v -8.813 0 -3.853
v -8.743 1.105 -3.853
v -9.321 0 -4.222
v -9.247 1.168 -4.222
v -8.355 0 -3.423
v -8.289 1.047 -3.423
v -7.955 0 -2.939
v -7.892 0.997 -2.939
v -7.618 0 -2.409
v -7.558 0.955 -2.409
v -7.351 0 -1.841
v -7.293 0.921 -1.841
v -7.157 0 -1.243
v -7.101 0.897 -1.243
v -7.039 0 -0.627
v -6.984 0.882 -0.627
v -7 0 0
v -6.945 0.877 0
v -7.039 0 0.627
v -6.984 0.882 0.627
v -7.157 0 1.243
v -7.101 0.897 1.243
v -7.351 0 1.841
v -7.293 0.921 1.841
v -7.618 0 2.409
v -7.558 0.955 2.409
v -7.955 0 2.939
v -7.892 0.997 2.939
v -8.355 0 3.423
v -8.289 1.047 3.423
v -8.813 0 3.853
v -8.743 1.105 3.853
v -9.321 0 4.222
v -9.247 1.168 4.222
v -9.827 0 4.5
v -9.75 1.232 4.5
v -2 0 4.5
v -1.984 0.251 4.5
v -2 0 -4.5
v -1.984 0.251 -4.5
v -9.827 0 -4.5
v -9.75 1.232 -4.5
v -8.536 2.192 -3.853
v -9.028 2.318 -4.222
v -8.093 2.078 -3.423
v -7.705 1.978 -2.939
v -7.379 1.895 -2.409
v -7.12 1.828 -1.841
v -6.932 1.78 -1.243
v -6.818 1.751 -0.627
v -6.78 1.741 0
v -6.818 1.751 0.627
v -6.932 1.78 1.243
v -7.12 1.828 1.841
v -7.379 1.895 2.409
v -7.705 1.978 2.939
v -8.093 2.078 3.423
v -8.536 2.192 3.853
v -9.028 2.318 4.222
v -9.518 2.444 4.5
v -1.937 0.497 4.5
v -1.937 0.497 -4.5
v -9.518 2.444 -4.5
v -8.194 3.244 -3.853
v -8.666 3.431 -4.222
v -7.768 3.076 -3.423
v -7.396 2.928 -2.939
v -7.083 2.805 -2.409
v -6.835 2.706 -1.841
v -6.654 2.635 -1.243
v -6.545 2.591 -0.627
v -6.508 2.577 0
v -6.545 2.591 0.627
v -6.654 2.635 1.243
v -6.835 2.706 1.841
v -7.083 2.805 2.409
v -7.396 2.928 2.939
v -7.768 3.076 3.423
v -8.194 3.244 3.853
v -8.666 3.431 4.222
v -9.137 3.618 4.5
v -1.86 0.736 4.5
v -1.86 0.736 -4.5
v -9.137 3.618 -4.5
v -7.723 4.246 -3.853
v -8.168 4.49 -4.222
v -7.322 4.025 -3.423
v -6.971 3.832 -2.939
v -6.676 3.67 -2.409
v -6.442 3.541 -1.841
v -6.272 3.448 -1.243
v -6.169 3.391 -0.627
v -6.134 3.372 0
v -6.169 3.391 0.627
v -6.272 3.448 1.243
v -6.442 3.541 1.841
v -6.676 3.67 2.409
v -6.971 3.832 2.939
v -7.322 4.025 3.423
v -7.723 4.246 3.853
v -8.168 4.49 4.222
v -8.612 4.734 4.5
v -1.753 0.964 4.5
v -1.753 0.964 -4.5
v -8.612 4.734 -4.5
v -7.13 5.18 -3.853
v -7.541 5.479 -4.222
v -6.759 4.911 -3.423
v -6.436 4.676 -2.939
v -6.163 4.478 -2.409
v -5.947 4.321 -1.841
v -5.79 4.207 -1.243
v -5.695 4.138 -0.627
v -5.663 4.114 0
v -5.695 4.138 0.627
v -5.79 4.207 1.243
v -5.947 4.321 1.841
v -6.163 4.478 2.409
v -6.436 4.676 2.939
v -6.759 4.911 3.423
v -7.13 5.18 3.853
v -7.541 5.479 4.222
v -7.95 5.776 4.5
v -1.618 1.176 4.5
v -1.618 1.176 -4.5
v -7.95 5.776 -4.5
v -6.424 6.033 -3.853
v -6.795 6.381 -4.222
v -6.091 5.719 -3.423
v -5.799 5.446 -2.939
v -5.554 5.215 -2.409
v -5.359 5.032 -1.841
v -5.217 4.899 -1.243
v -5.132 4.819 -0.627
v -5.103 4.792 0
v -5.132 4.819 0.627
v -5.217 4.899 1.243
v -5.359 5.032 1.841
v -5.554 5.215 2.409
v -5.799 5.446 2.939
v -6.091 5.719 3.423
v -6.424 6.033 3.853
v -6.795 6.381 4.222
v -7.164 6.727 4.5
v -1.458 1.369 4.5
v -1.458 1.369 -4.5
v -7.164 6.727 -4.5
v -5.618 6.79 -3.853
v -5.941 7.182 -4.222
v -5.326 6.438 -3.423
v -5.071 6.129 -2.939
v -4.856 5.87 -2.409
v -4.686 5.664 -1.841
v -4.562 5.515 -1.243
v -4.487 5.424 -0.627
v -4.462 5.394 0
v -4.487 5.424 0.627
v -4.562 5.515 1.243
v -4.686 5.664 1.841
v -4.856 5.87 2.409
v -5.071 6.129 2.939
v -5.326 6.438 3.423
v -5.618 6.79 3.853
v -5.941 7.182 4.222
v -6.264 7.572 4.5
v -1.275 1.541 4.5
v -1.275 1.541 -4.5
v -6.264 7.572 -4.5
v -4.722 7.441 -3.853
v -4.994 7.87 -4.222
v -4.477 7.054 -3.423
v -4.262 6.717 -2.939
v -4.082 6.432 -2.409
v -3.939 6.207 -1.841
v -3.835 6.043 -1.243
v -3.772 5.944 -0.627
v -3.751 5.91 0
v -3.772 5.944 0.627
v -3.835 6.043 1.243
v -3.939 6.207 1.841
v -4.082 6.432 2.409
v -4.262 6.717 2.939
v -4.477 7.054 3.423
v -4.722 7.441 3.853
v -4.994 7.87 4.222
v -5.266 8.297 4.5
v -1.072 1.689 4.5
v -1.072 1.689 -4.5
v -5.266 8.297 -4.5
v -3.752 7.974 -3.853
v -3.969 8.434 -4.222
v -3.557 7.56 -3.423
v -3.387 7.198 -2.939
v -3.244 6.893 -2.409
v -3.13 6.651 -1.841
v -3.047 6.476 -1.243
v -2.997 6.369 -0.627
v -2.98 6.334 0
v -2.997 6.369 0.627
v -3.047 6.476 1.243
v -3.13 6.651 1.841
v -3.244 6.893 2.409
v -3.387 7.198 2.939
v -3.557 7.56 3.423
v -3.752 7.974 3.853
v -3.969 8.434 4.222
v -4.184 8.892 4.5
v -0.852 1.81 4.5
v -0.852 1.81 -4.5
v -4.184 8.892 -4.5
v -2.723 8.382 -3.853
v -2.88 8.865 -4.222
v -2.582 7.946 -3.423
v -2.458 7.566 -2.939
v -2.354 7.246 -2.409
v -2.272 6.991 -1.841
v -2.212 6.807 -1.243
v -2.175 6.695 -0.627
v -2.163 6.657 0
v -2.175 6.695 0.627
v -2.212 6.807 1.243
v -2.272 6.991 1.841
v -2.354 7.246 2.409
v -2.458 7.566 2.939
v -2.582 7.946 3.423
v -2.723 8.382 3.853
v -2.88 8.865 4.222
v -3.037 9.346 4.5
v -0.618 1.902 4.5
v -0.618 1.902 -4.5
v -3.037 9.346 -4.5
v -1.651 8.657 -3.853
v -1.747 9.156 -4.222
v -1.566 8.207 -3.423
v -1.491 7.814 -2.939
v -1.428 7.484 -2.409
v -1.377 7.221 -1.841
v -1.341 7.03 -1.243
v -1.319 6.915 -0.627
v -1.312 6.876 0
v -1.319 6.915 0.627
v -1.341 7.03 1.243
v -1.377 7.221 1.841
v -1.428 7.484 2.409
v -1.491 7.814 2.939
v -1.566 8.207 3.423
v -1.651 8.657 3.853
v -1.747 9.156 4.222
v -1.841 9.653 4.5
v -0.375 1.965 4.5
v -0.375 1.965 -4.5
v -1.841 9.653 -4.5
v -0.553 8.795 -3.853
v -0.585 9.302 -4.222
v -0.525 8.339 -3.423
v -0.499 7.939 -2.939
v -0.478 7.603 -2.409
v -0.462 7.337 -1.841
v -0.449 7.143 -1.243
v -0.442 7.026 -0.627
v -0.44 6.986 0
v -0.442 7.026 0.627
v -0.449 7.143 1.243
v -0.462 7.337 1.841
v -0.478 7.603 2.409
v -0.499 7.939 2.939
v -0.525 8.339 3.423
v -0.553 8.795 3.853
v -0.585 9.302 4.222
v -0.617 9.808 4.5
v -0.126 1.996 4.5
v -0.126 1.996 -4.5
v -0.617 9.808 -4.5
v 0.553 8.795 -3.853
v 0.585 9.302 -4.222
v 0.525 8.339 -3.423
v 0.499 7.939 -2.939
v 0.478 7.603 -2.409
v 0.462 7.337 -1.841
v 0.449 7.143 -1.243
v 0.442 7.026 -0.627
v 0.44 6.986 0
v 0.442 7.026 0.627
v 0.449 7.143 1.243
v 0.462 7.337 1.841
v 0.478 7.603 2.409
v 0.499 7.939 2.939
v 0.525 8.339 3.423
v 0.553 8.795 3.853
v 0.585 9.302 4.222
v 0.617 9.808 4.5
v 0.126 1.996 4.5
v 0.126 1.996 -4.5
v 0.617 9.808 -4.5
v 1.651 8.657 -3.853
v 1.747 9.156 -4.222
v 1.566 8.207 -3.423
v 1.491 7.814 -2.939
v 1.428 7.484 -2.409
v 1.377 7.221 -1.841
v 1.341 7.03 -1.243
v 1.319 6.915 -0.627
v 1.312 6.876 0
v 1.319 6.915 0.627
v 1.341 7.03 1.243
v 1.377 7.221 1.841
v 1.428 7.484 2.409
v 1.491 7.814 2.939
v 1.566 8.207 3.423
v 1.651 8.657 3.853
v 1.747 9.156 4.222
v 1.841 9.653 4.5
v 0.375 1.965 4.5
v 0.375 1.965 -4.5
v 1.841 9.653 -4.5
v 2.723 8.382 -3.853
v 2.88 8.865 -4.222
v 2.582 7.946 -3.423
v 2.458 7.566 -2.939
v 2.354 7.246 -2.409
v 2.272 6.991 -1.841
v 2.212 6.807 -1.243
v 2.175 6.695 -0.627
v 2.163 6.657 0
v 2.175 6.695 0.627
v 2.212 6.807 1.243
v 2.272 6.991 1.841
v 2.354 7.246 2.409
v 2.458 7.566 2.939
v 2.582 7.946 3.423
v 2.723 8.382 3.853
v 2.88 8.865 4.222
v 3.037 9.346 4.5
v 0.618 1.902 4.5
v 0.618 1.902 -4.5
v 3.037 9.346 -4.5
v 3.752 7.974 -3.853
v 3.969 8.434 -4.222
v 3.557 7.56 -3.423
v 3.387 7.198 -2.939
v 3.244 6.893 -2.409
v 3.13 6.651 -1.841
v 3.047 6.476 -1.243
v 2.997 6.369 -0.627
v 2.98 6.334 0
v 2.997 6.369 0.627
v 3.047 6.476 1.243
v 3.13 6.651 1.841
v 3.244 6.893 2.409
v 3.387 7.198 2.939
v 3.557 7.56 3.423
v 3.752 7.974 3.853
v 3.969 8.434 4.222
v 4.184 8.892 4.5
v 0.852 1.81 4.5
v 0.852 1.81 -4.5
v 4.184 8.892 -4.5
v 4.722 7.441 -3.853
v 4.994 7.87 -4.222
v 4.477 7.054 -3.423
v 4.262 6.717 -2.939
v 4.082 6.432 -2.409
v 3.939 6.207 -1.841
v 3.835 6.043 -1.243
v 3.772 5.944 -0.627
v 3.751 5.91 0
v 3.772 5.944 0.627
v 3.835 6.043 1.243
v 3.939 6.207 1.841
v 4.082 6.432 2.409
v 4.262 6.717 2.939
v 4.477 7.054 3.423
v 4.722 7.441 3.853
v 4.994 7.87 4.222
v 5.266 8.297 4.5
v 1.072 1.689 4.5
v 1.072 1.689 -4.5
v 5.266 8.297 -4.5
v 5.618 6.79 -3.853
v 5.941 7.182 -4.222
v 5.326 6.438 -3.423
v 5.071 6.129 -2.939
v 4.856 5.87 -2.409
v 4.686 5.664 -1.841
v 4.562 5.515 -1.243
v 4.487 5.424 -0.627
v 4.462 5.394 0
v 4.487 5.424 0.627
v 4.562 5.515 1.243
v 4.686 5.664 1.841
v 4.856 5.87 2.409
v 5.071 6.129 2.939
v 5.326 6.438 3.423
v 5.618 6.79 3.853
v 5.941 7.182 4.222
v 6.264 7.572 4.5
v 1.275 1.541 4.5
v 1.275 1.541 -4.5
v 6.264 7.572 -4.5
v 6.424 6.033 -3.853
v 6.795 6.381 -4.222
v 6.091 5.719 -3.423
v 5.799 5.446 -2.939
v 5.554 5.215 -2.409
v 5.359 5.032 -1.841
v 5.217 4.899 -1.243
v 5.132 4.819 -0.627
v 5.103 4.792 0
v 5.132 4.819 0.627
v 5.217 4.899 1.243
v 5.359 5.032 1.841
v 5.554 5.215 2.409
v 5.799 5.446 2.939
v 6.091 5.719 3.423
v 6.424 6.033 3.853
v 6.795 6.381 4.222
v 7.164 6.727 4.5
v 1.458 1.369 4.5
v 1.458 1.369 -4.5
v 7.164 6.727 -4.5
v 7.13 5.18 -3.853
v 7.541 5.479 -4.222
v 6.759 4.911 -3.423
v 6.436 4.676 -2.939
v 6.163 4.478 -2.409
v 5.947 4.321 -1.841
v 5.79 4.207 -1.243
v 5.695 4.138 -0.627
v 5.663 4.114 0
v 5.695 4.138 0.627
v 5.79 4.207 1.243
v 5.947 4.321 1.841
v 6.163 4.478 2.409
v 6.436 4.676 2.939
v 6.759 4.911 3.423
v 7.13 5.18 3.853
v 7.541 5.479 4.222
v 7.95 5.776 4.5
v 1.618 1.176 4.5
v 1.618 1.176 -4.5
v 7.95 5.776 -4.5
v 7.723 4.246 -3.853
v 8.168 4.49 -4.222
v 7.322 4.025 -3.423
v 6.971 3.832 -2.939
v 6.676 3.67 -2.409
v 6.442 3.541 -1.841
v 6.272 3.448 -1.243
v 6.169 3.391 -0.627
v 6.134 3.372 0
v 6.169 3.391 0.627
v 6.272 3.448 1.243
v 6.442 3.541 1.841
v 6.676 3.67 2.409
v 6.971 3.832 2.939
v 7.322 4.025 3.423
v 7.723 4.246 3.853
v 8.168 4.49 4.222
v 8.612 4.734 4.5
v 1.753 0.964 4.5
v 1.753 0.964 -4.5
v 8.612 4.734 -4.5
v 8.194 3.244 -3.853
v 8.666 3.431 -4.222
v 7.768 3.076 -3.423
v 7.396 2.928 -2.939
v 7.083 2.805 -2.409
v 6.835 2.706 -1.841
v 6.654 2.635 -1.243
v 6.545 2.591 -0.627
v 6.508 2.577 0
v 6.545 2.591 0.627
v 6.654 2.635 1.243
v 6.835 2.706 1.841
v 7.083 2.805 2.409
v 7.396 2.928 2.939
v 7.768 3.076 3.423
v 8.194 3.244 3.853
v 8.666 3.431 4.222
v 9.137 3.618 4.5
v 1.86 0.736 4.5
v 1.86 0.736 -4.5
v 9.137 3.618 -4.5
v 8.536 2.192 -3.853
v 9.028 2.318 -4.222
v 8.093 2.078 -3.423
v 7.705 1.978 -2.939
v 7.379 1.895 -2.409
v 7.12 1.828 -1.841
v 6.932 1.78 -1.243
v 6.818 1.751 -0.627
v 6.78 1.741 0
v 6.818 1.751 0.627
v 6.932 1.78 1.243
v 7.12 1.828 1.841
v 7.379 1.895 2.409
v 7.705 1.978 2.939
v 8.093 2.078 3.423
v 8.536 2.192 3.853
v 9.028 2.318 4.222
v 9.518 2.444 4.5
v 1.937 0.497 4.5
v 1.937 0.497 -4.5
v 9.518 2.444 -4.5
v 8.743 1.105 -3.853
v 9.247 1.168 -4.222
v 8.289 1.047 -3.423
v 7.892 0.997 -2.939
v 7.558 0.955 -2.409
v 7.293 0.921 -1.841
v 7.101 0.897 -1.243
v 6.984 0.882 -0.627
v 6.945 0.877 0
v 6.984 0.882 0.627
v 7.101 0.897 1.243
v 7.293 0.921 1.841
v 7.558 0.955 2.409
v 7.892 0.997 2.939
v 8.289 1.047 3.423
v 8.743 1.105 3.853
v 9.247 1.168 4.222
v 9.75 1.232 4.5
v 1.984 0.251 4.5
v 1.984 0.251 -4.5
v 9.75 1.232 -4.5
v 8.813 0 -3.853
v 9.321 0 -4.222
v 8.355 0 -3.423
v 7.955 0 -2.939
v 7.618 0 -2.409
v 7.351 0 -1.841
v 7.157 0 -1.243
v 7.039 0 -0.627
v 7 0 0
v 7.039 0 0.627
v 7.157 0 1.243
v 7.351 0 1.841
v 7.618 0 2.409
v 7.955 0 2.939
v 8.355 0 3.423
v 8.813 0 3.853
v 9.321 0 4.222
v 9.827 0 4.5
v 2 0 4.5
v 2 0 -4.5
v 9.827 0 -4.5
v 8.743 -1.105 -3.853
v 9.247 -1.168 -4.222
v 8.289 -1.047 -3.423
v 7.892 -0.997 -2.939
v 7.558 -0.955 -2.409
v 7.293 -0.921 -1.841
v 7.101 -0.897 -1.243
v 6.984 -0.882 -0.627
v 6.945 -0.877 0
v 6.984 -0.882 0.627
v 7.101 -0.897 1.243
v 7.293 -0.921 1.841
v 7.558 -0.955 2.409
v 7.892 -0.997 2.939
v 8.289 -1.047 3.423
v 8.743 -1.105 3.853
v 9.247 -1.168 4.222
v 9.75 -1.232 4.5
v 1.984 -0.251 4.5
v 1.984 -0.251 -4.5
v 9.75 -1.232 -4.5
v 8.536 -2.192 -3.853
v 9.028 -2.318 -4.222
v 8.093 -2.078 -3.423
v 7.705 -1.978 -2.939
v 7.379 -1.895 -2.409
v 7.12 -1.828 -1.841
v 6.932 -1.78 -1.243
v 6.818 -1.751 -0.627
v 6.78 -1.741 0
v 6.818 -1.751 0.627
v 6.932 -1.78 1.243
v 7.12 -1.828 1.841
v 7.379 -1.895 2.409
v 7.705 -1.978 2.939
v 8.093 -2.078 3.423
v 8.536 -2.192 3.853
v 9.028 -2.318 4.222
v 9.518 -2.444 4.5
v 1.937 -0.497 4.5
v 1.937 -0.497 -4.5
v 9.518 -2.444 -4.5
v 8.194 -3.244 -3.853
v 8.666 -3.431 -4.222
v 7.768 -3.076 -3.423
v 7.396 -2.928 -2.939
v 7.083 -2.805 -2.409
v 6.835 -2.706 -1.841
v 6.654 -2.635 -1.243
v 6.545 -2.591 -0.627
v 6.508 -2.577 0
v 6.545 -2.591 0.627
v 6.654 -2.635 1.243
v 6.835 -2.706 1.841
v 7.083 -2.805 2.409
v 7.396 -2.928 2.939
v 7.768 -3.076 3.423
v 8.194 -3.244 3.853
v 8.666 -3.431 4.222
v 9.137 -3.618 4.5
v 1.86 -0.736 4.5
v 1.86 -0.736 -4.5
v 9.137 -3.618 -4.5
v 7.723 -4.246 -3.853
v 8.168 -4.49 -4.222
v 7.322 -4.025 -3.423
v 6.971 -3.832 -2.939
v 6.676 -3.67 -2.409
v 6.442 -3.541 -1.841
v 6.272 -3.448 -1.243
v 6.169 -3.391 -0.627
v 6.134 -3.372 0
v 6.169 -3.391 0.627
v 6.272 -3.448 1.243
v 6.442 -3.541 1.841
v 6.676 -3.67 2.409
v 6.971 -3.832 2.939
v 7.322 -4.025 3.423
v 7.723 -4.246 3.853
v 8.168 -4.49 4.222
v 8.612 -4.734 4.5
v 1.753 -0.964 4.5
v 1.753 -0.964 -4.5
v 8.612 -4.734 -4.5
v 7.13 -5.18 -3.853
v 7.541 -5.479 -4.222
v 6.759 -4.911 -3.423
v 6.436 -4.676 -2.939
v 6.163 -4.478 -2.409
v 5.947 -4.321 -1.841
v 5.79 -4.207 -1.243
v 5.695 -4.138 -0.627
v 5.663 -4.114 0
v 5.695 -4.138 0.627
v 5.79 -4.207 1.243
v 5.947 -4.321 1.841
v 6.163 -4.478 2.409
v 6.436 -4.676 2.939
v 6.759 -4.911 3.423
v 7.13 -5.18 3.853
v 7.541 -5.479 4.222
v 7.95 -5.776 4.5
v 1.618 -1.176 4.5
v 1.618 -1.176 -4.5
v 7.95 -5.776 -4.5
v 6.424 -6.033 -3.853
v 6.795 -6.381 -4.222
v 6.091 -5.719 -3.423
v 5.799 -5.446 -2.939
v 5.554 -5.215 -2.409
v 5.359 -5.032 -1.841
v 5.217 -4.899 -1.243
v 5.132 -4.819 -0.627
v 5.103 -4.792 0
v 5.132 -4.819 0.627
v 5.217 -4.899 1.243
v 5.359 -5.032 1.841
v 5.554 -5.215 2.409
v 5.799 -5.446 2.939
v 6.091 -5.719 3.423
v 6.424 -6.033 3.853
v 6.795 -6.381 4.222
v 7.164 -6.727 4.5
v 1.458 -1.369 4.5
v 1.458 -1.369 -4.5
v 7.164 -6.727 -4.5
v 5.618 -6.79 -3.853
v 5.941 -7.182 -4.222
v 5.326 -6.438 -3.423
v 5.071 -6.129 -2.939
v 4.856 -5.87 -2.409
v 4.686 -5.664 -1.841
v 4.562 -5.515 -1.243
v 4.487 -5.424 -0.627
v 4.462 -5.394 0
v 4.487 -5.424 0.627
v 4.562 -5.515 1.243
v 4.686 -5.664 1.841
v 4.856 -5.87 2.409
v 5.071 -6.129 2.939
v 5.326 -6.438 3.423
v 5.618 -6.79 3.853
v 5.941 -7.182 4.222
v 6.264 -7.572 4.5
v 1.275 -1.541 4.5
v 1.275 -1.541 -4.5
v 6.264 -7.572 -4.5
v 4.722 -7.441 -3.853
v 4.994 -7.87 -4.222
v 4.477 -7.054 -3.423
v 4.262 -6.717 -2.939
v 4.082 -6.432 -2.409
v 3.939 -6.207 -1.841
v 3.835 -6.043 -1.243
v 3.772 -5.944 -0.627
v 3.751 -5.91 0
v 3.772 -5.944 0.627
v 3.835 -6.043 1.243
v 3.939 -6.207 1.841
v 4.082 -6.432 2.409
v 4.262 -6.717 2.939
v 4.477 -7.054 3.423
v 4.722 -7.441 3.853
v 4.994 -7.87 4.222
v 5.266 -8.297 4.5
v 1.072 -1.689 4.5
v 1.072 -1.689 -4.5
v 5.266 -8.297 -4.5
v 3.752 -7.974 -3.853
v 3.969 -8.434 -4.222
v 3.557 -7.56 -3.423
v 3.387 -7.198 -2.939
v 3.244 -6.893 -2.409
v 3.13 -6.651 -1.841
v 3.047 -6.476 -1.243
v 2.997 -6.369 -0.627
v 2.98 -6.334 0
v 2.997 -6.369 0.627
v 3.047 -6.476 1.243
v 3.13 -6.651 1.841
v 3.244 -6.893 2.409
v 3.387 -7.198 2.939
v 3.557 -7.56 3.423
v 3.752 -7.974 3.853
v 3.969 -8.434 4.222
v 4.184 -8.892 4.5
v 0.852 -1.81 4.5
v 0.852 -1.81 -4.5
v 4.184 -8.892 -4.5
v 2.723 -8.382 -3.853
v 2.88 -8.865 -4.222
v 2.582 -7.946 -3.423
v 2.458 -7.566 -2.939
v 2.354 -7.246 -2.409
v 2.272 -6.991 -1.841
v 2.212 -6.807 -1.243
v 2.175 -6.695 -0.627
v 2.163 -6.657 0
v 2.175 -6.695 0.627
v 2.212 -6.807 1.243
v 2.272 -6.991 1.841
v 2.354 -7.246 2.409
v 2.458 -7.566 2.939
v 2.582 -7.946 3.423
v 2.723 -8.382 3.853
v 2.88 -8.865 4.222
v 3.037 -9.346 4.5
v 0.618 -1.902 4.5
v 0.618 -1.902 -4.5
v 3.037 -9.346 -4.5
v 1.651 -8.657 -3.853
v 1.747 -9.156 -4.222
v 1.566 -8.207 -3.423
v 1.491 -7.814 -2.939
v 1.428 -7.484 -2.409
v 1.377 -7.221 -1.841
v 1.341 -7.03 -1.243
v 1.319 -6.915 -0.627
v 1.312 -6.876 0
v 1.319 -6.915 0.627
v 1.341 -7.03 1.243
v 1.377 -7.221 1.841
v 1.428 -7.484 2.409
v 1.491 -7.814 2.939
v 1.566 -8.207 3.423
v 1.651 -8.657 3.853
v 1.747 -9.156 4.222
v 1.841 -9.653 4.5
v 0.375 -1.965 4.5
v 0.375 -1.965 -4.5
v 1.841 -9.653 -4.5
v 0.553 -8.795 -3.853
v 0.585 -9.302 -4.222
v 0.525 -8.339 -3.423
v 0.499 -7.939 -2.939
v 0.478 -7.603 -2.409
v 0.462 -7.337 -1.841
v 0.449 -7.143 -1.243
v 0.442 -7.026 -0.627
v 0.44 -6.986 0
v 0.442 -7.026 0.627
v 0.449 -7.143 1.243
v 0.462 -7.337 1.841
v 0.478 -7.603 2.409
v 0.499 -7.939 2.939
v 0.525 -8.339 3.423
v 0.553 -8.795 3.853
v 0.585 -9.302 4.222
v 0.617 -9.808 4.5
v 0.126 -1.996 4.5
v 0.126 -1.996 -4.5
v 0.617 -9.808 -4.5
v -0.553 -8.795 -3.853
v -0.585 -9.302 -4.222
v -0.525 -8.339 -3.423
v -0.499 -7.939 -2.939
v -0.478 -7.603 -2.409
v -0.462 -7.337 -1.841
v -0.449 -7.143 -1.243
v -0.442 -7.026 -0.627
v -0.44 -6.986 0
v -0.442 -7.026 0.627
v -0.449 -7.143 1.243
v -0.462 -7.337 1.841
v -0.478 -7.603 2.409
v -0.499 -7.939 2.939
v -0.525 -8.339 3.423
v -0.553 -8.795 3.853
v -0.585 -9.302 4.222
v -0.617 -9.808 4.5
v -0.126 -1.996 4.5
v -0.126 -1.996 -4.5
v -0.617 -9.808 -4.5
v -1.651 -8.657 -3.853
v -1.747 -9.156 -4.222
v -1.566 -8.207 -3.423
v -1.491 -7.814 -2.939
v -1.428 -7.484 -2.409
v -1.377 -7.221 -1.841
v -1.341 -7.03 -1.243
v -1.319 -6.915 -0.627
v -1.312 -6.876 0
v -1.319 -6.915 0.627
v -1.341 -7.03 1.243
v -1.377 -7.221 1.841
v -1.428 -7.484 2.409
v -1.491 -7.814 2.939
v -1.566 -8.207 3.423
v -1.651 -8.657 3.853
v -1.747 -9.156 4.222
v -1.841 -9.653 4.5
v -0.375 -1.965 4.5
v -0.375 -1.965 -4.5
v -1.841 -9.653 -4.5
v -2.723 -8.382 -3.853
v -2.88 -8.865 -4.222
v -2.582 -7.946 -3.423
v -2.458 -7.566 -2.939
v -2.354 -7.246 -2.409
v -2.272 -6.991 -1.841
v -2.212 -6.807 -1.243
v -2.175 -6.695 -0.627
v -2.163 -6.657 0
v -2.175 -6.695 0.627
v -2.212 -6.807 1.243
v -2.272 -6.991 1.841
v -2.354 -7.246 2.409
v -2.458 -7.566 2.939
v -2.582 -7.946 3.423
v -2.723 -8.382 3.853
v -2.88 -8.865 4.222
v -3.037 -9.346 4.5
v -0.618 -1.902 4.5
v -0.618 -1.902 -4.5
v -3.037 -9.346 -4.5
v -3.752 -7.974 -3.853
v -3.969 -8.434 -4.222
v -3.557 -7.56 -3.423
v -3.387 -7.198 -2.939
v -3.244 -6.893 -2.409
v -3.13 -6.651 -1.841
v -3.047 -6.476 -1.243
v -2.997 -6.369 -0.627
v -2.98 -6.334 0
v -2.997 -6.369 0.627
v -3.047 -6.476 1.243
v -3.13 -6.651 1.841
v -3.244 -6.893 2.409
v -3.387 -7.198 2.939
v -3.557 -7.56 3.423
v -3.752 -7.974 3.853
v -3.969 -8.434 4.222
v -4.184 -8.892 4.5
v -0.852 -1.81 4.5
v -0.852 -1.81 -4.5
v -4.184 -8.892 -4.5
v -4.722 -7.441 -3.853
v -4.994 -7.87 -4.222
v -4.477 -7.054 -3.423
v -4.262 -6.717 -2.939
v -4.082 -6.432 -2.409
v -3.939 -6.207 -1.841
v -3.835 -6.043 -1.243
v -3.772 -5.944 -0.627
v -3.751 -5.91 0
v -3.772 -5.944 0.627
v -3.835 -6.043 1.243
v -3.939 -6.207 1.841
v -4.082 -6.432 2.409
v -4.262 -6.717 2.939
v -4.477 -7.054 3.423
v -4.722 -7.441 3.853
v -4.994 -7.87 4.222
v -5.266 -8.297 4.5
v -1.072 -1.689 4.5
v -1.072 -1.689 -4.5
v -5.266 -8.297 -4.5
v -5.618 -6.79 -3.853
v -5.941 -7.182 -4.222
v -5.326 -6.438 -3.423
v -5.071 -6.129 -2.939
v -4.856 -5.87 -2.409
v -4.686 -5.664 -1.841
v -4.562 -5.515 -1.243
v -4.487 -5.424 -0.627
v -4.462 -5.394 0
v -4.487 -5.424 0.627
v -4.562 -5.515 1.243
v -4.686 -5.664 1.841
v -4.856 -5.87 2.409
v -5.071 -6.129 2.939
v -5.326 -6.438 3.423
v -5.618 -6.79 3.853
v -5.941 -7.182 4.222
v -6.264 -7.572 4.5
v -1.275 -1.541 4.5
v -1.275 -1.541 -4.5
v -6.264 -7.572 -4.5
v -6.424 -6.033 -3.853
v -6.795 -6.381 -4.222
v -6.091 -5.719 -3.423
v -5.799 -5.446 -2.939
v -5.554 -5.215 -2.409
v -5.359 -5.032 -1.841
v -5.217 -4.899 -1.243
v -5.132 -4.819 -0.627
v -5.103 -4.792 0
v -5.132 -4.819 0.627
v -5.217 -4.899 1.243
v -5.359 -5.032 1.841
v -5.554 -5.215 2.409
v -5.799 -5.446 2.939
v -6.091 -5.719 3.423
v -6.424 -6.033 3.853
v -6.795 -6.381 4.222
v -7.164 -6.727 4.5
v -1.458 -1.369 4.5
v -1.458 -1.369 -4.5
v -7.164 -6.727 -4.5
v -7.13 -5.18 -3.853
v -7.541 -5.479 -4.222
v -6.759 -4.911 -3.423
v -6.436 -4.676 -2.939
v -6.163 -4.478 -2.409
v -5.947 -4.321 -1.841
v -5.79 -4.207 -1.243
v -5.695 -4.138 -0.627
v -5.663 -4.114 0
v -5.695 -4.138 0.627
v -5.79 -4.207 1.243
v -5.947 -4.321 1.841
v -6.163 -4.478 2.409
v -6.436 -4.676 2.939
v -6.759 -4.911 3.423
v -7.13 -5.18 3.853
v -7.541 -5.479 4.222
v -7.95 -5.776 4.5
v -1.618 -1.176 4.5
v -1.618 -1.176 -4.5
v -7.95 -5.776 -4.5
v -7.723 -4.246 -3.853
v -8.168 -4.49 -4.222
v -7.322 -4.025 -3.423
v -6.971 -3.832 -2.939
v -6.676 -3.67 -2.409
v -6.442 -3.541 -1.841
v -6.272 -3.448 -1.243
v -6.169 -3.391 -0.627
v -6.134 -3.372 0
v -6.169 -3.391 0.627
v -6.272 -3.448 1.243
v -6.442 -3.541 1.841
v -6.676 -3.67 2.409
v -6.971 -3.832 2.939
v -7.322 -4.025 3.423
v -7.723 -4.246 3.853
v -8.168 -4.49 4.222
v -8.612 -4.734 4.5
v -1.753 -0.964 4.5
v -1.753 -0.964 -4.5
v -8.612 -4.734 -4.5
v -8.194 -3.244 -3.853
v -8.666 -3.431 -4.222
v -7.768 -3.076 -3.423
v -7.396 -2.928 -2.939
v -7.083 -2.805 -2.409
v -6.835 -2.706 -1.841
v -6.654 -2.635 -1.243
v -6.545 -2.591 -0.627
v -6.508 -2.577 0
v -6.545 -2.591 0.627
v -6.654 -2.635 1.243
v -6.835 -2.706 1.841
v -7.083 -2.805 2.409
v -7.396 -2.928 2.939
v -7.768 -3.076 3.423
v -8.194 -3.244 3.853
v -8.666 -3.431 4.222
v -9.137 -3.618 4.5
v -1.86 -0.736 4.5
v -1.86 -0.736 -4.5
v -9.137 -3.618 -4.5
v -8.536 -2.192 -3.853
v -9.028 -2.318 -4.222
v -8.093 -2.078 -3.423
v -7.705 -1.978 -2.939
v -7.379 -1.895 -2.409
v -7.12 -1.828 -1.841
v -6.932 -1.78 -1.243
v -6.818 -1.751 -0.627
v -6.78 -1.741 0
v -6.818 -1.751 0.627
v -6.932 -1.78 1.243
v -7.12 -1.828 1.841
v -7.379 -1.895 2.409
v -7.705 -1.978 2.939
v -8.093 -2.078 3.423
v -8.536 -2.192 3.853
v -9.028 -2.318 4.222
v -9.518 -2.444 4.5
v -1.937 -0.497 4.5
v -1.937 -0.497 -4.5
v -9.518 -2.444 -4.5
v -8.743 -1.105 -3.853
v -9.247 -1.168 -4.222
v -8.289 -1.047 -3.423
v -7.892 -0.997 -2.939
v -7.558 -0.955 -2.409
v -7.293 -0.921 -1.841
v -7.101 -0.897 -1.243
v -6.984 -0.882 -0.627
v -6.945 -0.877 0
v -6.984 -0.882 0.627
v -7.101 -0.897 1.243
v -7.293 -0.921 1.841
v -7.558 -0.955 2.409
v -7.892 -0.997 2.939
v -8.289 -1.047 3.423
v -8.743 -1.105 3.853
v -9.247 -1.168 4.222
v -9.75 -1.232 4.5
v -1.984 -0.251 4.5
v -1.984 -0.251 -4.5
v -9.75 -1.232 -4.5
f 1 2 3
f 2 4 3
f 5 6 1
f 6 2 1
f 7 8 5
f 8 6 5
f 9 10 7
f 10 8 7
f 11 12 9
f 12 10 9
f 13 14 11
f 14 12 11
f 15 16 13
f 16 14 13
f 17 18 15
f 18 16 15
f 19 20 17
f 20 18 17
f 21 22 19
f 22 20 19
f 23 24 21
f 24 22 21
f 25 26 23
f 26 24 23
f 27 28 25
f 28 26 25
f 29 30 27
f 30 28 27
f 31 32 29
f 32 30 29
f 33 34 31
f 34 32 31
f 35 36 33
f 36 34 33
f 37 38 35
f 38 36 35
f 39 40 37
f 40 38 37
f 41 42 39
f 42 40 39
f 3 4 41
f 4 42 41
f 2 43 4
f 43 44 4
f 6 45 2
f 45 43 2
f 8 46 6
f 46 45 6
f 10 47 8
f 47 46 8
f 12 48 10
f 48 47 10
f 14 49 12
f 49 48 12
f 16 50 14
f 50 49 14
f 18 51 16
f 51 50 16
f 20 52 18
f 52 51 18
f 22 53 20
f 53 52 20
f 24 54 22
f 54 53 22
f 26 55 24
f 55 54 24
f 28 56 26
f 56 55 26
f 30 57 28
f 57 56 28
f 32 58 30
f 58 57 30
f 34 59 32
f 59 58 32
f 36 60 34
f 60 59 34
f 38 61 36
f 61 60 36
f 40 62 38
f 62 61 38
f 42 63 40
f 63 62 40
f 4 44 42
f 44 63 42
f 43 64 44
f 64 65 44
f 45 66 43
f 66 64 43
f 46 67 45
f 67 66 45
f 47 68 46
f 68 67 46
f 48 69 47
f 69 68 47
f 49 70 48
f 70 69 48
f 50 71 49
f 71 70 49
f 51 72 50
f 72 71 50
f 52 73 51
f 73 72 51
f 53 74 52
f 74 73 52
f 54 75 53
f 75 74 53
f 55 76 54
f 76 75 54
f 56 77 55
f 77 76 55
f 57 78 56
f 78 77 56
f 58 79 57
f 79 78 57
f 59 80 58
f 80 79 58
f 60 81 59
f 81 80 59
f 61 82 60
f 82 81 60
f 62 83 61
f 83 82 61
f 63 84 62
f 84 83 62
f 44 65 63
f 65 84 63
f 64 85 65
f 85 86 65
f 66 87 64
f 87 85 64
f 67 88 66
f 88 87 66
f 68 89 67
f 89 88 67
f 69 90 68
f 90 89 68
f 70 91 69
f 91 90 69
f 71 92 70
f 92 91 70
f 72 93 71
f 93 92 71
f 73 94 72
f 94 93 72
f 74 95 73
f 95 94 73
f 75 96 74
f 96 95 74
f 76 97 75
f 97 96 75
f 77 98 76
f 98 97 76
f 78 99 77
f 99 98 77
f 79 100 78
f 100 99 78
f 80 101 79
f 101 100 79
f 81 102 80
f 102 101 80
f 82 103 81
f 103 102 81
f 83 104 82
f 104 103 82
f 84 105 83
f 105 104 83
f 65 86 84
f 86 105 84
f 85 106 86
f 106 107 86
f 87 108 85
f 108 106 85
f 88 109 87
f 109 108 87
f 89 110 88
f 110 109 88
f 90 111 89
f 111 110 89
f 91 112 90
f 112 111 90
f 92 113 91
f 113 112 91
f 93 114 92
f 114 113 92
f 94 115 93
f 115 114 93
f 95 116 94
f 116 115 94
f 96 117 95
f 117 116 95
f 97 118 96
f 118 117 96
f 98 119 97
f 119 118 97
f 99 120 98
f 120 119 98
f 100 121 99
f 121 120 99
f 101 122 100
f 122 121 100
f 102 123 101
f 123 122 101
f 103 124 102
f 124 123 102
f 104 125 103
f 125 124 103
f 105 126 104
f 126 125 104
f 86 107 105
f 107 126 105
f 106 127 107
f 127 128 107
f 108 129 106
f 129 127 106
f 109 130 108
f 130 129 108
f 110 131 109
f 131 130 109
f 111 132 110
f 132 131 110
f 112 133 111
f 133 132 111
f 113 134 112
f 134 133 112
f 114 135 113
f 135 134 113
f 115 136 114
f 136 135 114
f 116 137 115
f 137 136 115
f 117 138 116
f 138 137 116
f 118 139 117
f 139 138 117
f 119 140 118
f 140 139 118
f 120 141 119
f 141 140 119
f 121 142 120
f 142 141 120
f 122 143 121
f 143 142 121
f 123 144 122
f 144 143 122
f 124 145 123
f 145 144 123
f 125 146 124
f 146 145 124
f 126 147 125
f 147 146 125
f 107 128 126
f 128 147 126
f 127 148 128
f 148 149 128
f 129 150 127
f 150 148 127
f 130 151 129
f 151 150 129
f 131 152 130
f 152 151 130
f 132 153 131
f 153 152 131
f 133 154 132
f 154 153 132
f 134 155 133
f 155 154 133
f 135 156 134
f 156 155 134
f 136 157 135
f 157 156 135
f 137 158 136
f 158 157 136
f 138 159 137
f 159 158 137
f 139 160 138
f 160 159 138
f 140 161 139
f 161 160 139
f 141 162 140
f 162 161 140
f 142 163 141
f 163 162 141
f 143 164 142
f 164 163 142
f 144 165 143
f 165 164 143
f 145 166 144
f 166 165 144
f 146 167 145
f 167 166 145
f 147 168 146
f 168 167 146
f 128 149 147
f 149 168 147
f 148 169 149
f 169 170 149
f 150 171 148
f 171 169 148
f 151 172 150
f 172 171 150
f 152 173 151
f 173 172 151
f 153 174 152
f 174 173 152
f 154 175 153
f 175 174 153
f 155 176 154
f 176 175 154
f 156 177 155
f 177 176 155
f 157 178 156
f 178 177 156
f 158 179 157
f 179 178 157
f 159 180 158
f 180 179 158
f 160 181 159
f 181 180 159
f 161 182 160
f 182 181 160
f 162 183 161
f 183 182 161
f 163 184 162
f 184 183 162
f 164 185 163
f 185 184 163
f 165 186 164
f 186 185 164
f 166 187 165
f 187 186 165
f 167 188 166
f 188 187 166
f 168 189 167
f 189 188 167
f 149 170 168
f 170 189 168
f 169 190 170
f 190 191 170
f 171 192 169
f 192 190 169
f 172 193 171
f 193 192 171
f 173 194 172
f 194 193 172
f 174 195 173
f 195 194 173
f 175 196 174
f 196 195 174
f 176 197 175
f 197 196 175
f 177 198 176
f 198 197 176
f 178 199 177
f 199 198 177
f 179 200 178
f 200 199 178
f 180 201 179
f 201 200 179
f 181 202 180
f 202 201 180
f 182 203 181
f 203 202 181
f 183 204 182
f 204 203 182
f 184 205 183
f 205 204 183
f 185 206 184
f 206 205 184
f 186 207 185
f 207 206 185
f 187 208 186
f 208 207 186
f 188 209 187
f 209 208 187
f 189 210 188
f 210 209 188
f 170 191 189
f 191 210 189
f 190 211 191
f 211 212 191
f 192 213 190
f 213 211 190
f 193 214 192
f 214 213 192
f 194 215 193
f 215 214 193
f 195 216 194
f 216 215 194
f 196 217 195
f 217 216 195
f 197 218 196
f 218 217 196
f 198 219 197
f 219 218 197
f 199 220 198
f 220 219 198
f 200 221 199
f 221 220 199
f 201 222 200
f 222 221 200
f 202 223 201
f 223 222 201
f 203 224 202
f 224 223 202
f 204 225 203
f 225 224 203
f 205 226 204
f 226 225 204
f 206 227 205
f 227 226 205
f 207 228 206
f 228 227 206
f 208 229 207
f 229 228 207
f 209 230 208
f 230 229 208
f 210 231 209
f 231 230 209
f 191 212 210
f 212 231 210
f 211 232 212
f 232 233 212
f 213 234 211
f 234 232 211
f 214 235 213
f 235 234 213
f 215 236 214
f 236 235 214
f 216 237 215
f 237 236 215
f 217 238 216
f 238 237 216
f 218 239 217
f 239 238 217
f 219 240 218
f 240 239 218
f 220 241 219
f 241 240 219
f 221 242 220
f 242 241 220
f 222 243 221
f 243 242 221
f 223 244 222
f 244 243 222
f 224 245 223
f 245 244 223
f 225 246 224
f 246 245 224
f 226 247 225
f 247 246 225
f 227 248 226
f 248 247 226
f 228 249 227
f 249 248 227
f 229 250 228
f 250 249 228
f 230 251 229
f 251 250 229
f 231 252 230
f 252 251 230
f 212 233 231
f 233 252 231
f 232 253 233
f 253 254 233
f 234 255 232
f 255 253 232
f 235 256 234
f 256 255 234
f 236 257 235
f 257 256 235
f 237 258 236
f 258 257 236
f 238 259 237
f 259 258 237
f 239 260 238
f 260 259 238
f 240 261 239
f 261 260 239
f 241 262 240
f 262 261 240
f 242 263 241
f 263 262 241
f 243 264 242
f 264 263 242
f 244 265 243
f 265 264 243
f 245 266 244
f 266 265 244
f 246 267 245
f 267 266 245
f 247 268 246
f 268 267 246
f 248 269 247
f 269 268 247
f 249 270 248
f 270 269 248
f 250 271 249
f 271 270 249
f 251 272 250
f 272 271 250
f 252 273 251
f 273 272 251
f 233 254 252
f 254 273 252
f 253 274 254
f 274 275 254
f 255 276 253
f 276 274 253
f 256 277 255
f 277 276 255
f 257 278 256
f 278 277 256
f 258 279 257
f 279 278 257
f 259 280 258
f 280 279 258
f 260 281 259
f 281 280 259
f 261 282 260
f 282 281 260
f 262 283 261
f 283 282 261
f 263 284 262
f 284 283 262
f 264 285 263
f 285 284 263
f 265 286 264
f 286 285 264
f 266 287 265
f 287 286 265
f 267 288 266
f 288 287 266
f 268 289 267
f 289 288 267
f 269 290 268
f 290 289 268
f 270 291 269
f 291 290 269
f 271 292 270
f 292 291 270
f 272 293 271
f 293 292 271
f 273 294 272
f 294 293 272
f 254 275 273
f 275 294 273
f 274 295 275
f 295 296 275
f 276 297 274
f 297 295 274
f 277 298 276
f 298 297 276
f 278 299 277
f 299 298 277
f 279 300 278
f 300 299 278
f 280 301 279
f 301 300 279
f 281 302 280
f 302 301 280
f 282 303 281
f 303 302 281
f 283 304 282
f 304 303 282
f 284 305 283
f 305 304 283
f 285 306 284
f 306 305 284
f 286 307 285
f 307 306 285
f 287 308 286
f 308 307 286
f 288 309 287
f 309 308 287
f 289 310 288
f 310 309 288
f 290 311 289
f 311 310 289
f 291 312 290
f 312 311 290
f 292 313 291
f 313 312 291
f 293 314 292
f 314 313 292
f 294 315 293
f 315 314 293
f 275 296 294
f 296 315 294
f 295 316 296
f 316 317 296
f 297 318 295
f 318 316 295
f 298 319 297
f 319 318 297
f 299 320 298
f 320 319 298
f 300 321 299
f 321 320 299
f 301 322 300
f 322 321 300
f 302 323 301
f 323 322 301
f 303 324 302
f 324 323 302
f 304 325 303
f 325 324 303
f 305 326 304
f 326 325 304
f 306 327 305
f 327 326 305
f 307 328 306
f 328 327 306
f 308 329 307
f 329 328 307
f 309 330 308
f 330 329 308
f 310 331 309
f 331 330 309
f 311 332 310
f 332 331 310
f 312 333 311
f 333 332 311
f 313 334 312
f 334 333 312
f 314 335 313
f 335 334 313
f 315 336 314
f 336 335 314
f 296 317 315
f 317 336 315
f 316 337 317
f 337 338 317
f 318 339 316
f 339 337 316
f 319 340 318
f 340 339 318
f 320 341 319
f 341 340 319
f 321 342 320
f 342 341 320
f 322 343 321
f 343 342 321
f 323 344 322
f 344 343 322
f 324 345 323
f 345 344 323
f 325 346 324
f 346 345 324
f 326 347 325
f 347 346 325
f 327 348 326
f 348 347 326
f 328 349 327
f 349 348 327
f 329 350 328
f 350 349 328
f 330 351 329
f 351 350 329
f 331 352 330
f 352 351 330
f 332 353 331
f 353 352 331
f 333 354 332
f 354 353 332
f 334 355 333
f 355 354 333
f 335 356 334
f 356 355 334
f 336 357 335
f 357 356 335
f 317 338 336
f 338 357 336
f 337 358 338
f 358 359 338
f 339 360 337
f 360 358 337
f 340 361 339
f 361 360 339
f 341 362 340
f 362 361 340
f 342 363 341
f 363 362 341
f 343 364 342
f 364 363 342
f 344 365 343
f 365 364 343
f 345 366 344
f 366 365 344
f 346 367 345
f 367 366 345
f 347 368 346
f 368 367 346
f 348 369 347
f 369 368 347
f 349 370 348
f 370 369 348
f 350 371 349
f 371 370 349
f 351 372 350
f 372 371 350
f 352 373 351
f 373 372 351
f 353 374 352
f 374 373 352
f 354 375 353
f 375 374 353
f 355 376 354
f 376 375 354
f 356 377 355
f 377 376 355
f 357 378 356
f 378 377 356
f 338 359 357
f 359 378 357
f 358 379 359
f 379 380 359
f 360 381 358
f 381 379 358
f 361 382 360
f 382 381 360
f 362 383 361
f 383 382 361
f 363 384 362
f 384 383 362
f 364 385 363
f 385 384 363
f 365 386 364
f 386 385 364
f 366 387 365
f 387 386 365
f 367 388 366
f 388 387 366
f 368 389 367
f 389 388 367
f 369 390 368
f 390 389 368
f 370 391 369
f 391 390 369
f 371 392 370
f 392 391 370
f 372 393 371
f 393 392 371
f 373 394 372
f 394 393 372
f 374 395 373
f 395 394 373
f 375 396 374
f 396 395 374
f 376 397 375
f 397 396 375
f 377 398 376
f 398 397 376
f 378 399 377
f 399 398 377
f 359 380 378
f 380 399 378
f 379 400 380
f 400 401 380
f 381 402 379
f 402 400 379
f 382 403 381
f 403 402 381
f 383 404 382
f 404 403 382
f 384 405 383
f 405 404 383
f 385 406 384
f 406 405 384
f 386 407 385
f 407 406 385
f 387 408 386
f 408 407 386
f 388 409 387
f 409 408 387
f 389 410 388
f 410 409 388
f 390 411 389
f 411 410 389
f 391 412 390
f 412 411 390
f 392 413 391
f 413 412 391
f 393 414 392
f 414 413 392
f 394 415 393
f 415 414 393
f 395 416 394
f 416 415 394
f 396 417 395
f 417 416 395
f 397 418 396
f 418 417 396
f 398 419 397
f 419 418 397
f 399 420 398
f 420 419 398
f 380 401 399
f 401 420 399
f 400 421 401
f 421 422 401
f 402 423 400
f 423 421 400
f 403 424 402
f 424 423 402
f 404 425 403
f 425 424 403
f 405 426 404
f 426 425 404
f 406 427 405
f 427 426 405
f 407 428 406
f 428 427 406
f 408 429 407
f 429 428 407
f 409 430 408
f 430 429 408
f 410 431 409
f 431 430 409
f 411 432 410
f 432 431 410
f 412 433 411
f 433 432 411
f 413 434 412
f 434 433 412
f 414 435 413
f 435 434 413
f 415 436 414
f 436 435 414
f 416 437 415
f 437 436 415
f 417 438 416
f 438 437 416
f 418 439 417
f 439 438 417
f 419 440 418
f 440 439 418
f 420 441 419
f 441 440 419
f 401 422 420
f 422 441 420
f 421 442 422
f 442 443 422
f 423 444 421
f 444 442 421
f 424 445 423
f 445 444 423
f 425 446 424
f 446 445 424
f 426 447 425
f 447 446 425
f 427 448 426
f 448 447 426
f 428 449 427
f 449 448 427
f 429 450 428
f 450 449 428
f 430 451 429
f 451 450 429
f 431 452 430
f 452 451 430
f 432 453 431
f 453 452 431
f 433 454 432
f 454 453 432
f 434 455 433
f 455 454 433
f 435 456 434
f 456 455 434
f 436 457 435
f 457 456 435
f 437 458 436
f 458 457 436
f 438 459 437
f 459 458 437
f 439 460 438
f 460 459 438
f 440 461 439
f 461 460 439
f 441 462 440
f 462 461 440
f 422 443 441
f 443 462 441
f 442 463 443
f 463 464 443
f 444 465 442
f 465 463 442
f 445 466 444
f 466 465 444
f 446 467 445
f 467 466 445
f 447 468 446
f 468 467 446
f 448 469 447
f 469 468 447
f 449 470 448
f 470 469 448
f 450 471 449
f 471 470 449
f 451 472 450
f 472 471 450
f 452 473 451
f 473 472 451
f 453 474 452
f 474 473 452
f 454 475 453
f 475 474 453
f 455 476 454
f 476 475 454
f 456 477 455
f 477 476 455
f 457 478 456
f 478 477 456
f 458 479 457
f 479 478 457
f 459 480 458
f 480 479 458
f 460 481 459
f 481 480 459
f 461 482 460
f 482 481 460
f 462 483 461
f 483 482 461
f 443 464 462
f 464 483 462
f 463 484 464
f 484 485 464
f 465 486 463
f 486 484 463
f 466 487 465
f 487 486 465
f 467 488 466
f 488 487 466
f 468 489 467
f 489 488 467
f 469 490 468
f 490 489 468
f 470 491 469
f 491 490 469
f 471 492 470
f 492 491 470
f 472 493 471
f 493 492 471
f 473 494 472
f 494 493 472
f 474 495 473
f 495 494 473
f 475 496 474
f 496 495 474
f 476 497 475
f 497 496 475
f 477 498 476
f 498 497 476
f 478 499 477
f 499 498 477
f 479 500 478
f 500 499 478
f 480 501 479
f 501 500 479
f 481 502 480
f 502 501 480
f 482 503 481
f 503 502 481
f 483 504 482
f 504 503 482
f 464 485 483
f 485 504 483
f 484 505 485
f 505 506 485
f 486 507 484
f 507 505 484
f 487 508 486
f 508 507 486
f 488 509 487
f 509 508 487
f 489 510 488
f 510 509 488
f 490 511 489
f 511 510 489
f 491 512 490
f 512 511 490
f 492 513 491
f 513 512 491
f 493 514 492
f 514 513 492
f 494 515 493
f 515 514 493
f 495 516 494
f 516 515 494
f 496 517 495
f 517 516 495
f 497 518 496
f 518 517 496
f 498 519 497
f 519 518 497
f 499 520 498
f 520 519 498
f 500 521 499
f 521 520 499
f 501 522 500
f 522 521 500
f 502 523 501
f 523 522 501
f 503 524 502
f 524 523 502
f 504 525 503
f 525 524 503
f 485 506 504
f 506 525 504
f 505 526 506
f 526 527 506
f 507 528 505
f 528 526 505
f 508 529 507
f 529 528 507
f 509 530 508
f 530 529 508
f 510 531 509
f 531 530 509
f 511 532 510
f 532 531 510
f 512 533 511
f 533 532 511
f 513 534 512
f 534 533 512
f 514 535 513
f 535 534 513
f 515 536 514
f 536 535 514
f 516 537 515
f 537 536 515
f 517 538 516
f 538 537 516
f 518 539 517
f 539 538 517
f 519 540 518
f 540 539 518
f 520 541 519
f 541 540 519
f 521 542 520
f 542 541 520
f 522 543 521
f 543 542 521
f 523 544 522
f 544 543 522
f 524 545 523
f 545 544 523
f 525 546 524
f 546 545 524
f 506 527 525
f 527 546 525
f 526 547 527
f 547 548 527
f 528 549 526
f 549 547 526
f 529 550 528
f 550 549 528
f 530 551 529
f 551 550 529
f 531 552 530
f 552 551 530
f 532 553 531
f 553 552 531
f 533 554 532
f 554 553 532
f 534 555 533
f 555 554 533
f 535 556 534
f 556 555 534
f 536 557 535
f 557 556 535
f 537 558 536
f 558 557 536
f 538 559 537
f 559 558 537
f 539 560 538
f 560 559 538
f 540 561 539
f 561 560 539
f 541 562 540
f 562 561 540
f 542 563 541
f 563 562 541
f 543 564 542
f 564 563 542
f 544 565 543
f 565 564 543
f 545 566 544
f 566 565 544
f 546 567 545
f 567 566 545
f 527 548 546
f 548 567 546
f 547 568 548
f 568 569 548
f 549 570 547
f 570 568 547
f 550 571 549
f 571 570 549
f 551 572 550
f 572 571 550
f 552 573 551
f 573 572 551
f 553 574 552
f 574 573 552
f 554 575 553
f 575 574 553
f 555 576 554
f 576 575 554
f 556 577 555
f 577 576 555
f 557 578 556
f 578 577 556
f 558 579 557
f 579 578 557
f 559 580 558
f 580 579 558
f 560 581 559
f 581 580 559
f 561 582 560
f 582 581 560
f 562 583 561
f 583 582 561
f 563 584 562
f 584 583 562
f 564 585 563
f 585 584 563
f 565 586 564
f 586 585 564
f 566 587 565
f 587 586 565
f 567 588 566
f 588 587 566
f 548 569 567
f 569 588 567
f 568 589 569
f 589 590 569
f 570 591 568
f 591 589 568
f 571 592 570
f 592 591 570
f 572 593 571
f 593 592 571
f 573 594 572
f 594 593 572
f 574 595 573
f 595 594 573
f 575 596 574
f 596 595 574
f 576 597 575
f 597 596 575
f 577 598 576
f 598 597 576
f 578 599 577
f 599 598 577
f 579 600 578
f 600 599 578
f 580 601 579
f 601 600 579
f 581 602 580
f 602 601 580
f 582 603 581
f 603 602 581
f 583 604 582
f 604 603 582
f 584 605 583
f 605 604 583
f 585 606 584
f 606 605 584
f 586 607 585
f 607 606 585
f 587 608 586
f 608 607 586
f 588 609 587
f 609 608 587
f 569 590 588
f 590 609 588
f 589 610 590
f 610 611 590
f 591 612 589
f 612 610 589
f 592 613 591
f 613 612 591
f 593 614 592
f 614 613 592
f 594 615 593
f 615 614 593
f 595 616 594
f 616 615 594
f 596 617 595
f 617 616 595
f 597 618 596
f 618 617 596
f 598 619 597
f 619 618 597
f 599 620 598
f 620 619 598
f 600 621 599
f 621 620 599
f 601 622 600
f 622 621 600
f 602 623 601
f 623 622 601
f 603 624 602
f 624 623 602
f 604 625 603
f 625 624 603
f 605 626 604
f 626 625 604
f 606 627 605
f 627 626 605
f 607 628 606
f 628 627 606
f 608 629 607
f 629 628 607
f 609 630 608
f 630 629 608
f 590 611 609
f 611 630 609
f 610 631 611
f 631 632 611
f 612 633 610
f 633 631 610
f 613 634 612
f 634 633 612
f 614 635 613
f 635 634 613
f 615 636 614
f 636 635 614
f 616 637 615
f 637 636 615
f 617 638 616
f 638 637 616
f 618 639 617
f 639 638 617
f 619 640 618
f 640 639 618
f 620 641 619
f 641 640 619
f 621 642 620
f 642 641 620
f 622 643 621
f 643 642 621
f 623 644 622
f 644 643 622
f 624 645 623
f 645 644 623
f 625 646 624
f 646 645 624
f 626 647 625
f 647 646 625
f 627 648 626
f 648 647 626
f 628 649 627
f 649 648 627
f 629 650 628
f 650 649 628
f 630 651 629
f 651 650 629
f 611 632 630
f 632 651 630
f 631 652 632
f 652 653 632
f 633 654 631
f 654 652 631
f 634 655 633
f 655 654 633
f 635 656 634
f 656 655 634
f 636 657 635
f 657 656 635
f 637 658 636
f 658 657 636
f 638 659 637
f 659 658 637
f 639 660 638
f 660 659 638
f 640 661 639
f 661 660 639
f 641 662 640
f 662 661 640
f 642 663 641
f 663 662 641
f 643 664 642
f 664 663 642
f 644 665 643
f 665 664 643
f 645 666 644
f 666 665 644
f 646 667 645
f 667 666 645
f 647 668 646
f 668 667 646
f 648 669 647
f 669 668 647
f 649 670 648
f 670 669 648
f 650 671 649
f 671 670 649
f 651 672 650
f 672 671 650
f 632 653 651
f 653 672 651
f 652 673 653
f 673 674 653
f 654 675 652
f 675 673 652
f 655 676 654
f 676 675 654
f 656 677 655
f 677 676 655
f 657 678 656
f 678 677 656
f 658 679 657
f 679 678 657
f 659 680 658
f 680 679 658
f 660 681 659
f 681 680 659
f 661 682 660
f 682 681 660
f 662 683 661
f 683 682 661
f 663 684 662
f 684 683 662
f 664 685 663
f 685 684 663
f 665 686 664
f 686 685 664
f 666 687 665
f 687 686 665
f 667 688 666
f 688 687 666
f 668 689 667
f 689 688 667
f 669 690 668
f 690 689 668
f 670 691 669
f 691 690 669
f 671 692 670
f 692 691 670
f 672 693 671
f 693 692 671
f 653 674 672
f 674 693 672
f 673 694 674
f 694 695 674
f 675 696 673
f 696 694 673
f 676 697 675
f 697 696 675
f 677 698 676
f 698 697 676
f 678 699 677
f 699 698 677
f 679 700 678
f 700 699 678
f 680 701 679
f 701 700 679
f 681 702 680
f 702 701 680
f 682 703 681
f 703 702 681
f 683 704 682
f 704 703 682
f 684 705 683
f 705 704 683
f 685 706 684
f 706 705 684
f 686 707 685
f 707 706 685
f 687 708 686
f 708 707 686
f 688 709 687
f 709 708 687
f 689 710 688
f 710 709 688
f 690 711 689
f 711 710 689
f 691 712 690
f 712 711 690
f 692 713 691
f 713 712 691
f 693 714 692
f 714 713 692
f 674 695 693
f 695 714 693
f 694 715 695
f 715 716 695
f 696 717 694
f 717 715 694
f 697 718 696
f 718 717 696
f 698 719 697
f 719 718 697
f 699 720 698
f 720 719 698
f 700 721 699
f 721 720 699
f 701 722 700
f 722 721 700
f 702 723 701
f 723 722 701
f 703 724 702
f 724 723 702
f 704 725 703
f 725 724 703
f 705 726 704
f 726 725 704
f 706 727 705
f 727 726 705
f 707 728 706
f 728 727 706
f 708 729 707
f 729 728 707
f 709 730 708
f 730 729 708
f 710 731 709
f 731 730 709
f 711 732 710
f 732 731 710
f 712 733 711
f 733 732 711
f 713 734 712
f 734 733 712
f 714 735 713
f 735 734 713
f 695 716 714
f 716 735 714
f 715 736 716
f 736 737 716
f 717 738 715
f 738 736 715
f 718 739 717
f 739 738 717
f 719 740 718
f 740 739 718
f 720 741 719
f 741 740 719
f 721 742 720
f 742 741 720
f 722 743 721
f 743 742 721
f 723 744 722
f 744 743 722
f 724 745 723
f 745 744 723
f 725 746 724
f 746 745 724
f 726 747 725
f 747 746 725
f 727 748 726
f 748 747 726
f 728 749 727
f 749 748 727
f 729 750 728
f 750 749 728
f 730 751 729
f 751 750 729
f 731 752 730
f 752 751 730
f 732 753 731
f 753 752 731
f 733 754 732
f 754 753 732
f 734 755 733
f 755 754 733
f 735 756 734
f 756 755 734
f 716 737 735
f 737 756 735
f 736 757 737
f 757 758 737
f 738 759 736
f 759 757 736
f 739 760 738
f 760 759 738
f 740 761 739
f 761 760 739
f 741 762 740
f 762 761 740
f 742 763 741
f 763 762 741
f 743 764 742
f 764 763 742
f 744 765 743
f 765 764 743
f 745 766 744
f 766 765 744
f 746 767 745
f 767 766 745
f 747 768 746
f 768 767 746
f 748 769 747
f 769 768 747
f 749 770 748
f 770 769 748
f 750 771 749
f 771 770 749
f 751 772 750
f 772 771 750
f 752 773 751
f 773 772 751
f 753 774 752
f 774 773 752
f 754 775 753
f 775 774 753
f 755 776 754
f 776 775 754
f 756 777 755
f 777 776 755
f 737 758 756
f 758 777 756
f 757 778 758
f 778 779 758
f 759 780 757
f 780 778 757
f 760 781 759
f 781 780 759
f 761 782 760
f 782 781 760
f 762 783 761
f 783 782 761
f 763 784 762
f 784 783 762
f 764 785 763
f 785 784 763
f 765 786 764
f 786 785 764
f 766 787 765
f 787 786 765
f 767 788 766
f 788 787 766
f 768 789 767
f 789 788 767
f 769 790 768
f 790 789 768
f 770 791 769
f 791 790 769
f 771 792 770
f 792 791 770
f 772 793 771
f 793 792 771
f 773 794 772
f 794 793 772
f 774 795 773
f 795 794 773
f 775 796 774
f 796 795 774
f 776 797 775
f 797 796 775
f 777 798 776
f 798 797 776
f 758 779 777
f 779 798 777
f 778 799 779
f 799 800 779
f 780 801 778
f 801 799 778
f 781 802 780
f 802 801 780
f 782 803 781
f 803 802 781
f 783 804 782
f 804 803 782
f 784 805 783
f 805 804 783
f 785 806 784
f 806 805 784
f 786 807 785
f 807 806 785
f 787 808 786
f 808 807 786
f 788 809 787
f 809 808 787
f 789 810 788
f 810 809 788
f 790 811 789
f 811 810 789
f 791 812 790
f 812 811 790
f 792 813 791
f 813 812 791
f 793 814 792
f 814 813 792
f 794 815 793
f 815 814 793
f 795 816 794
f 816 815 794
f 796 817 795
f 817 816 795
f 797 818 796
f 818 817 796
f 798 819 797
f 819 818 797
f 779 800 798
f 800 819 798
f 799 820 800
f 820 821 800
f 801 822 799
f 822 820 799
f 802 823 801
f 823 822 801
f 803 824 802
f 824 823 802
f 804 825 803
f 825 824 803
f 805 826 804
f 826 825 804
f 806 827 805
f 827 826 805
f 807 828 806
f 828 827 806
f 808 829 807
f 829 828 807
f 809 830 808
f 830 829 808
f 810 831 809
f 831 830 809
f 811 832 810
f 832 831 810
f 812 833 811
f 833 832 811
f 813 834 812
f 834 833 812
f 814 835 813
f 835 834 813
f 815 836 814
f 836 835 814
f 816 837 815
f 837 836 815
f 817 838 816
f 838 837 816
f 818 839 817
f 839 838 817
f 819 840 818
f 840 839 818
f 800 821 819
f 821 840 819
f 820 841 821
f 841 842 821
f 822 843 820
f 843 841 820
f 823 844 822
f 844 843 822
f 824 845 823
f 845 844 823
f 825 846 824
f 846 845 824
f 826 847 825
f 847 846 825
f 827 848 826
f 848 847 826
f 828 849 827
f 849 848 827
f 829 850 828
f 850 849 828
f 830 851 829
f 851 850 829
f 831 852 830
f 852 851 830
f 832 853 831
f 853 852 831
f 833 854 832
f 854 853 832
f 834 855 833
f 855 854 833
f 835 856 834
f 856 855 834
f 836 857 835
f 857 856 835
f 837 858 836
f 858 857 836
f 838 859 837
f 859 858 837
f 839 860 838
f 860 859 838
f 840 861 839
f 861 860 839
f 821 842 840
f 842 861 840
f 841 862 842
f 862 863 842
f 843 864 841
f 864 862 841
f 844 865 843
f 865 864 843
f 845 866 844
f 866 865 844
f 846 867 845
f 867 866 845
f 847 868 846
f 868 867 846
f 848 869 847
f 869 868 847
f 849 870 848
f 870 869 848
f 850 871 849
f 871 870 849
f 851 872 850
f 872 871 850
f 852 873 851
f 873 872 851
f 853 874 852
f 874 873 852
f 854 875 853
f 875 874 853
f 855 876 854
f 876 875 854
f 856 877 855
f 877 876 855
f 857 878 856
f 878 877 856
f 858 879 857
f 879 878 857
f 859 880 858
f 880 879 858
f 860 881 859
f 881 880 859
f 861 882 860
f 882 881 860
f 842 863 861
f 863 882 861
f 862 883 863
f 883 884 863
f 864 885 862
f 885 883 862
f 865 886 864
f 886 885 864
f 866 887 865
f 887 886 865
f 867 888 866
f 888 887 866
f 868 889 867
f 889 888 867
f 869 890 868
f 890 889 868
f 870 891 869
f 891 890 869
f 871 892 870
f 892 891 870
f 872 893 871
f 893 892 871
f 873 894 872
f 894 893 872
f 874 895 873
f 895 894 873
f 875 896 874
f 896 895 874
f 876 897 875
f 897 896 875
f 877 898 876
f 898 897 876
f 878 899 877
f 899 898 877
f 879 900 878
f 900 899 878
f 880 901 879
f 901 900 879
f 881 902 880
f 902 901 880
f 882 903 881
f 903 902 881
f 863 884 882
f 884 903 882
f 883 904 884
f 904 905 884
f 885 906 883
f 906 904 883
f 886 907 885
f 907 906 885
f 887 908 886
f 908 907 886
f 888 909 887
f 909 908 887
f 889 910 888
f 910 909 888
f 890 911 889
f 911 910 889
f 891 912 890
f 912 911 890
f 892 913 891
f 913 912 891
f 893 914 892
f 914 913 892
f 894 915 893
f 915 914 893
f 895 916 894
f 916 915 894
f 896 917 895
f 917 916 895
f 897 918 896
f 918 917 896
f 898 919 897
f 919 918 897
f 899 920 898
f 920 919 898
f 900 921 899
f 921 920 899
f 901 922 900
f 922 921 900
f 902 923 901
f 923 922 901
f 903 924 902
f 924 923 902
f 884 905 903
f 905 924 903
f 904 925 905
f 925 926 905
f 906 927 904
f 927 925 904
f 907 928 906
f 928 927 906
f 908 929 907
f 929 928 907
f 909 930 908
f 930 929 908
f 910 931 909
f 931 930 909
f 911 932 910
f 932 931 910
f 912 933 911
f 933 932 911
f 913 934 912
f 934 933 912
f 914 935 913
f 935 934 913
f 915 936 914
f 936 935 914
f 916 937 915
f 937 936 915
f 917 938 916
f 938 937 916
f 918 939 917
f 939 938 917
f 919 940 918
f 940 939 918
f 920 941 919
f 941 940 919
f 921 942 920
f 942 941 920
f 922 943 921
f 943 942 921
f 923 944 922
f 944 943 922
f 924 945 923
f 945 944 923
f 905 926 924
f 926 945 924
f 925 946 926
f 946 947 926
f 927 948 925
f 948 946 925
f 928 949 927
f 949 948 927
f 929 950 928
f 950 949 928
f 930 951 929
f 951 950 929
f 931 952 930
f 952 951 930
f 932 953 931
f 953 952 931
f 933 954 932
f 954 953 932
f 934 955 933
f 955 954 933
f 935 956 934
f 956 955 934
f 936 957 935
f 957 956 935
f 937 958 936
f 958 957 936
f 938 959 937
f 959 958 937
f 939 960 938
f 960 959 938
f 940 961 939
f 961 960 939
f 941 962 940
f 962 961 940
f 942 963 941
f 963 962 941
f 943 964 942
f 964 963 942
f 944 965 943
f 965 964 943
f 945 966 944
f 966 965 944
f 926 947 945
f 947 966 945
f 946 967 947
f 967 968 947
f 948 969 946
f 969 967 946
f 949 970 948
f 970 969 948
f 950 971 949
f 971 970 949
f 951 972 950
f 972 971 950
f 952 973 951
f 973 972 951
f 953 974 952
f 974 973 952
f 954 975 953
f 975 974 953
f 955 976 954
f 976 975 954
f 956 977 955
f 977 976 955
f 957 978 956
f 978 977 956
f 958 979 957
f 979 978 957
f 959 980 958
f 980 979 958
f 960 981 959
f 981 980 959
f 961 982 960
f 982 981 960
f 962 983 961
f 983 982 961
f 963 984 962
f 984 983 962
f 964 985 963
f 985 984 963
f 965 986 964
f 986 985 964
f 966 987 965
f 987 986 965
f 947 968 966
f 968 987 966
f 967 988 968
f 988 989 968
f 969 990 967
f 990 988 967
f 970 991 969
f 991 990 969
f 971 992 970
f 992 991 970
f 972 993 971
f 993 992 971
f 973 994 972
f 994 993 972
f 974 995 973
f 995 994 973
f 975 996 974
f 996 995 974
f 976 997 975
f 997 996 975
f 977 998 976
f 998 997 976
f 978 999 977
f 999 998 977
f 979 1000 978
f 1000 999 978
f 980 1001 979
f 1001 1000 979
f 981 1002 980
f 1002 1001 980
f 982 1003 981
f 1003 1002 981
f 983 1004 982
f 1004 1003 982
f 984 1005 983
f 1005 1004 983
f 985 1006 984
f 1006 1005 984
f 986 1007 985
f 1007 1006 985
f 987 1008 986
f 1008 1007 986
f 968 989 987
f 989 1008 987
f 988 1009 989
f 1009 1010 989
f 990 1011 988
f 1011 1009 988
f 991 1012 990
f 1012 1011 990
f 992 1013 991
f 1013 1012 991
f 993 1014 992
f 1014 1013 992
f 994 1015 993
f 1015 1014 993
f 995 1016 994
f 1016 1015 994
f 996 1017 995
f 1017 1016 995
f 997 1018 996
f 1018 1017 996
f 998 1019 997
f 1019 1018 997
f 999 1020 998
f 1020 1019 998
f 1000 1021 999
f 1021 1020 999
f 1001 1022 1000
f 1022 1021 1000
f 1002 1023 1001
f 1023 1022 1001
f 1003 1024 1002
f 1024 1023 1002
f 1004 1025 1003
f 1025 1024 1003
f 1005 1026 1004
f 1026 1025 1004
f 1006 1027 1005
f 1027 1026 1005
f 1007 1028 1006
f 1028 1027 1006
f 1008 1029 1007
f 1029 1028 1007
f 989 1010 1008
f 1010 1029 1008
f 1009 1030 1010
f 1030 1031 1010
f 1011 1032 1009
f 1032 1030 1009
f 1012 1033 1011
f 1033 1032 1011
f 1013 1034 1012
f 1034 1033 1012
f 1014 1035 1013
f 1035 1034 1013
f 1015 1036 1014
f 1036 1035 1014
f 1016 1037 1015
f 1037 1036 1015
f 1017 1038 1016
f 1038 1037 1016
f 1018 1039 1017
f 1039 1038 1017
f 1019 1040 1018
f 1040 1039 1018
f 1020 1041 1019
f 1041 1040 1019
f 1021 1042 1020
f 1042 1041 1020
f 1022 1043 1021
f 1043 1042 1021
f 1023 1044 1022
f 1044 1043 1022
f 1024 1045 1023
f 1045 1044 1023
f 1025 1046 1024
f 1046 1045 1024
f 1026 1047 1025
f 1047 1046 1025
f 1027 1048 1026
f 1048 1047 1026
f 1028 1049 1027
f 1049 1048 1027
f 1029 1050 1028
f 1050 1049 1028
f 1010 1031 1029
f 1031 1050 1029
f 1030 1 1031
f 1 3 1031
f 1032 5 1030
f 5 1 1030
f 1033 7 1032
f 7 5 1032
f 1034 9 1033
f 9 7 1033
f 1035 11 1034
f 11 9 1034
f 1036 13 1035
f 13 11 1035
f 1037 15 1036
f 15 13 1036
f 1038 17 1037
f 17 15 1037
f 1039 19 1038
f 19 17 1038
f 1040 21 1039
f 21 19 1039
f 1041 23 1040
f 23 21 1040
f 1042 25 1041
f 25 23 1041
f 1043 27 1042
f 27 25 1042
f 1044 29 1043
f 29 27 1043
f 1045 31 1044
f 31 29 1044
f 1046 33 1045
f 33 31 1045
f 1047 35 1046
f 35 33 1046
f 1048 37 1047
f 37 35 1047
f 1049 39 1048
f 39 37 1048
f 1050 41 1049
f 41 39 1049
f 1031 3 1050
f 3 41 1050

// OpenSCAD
$fn = 50;
radius = 10;
hole = 2;
height = 9;
rotate_extrude(){
    translate([radius/2+hole, 0, 0]){
        difference(){
            square([radius,height],center=true);
            translate([radius/2,0,0]){
                circle(r=radius/2);
            }
        }
    }
}
